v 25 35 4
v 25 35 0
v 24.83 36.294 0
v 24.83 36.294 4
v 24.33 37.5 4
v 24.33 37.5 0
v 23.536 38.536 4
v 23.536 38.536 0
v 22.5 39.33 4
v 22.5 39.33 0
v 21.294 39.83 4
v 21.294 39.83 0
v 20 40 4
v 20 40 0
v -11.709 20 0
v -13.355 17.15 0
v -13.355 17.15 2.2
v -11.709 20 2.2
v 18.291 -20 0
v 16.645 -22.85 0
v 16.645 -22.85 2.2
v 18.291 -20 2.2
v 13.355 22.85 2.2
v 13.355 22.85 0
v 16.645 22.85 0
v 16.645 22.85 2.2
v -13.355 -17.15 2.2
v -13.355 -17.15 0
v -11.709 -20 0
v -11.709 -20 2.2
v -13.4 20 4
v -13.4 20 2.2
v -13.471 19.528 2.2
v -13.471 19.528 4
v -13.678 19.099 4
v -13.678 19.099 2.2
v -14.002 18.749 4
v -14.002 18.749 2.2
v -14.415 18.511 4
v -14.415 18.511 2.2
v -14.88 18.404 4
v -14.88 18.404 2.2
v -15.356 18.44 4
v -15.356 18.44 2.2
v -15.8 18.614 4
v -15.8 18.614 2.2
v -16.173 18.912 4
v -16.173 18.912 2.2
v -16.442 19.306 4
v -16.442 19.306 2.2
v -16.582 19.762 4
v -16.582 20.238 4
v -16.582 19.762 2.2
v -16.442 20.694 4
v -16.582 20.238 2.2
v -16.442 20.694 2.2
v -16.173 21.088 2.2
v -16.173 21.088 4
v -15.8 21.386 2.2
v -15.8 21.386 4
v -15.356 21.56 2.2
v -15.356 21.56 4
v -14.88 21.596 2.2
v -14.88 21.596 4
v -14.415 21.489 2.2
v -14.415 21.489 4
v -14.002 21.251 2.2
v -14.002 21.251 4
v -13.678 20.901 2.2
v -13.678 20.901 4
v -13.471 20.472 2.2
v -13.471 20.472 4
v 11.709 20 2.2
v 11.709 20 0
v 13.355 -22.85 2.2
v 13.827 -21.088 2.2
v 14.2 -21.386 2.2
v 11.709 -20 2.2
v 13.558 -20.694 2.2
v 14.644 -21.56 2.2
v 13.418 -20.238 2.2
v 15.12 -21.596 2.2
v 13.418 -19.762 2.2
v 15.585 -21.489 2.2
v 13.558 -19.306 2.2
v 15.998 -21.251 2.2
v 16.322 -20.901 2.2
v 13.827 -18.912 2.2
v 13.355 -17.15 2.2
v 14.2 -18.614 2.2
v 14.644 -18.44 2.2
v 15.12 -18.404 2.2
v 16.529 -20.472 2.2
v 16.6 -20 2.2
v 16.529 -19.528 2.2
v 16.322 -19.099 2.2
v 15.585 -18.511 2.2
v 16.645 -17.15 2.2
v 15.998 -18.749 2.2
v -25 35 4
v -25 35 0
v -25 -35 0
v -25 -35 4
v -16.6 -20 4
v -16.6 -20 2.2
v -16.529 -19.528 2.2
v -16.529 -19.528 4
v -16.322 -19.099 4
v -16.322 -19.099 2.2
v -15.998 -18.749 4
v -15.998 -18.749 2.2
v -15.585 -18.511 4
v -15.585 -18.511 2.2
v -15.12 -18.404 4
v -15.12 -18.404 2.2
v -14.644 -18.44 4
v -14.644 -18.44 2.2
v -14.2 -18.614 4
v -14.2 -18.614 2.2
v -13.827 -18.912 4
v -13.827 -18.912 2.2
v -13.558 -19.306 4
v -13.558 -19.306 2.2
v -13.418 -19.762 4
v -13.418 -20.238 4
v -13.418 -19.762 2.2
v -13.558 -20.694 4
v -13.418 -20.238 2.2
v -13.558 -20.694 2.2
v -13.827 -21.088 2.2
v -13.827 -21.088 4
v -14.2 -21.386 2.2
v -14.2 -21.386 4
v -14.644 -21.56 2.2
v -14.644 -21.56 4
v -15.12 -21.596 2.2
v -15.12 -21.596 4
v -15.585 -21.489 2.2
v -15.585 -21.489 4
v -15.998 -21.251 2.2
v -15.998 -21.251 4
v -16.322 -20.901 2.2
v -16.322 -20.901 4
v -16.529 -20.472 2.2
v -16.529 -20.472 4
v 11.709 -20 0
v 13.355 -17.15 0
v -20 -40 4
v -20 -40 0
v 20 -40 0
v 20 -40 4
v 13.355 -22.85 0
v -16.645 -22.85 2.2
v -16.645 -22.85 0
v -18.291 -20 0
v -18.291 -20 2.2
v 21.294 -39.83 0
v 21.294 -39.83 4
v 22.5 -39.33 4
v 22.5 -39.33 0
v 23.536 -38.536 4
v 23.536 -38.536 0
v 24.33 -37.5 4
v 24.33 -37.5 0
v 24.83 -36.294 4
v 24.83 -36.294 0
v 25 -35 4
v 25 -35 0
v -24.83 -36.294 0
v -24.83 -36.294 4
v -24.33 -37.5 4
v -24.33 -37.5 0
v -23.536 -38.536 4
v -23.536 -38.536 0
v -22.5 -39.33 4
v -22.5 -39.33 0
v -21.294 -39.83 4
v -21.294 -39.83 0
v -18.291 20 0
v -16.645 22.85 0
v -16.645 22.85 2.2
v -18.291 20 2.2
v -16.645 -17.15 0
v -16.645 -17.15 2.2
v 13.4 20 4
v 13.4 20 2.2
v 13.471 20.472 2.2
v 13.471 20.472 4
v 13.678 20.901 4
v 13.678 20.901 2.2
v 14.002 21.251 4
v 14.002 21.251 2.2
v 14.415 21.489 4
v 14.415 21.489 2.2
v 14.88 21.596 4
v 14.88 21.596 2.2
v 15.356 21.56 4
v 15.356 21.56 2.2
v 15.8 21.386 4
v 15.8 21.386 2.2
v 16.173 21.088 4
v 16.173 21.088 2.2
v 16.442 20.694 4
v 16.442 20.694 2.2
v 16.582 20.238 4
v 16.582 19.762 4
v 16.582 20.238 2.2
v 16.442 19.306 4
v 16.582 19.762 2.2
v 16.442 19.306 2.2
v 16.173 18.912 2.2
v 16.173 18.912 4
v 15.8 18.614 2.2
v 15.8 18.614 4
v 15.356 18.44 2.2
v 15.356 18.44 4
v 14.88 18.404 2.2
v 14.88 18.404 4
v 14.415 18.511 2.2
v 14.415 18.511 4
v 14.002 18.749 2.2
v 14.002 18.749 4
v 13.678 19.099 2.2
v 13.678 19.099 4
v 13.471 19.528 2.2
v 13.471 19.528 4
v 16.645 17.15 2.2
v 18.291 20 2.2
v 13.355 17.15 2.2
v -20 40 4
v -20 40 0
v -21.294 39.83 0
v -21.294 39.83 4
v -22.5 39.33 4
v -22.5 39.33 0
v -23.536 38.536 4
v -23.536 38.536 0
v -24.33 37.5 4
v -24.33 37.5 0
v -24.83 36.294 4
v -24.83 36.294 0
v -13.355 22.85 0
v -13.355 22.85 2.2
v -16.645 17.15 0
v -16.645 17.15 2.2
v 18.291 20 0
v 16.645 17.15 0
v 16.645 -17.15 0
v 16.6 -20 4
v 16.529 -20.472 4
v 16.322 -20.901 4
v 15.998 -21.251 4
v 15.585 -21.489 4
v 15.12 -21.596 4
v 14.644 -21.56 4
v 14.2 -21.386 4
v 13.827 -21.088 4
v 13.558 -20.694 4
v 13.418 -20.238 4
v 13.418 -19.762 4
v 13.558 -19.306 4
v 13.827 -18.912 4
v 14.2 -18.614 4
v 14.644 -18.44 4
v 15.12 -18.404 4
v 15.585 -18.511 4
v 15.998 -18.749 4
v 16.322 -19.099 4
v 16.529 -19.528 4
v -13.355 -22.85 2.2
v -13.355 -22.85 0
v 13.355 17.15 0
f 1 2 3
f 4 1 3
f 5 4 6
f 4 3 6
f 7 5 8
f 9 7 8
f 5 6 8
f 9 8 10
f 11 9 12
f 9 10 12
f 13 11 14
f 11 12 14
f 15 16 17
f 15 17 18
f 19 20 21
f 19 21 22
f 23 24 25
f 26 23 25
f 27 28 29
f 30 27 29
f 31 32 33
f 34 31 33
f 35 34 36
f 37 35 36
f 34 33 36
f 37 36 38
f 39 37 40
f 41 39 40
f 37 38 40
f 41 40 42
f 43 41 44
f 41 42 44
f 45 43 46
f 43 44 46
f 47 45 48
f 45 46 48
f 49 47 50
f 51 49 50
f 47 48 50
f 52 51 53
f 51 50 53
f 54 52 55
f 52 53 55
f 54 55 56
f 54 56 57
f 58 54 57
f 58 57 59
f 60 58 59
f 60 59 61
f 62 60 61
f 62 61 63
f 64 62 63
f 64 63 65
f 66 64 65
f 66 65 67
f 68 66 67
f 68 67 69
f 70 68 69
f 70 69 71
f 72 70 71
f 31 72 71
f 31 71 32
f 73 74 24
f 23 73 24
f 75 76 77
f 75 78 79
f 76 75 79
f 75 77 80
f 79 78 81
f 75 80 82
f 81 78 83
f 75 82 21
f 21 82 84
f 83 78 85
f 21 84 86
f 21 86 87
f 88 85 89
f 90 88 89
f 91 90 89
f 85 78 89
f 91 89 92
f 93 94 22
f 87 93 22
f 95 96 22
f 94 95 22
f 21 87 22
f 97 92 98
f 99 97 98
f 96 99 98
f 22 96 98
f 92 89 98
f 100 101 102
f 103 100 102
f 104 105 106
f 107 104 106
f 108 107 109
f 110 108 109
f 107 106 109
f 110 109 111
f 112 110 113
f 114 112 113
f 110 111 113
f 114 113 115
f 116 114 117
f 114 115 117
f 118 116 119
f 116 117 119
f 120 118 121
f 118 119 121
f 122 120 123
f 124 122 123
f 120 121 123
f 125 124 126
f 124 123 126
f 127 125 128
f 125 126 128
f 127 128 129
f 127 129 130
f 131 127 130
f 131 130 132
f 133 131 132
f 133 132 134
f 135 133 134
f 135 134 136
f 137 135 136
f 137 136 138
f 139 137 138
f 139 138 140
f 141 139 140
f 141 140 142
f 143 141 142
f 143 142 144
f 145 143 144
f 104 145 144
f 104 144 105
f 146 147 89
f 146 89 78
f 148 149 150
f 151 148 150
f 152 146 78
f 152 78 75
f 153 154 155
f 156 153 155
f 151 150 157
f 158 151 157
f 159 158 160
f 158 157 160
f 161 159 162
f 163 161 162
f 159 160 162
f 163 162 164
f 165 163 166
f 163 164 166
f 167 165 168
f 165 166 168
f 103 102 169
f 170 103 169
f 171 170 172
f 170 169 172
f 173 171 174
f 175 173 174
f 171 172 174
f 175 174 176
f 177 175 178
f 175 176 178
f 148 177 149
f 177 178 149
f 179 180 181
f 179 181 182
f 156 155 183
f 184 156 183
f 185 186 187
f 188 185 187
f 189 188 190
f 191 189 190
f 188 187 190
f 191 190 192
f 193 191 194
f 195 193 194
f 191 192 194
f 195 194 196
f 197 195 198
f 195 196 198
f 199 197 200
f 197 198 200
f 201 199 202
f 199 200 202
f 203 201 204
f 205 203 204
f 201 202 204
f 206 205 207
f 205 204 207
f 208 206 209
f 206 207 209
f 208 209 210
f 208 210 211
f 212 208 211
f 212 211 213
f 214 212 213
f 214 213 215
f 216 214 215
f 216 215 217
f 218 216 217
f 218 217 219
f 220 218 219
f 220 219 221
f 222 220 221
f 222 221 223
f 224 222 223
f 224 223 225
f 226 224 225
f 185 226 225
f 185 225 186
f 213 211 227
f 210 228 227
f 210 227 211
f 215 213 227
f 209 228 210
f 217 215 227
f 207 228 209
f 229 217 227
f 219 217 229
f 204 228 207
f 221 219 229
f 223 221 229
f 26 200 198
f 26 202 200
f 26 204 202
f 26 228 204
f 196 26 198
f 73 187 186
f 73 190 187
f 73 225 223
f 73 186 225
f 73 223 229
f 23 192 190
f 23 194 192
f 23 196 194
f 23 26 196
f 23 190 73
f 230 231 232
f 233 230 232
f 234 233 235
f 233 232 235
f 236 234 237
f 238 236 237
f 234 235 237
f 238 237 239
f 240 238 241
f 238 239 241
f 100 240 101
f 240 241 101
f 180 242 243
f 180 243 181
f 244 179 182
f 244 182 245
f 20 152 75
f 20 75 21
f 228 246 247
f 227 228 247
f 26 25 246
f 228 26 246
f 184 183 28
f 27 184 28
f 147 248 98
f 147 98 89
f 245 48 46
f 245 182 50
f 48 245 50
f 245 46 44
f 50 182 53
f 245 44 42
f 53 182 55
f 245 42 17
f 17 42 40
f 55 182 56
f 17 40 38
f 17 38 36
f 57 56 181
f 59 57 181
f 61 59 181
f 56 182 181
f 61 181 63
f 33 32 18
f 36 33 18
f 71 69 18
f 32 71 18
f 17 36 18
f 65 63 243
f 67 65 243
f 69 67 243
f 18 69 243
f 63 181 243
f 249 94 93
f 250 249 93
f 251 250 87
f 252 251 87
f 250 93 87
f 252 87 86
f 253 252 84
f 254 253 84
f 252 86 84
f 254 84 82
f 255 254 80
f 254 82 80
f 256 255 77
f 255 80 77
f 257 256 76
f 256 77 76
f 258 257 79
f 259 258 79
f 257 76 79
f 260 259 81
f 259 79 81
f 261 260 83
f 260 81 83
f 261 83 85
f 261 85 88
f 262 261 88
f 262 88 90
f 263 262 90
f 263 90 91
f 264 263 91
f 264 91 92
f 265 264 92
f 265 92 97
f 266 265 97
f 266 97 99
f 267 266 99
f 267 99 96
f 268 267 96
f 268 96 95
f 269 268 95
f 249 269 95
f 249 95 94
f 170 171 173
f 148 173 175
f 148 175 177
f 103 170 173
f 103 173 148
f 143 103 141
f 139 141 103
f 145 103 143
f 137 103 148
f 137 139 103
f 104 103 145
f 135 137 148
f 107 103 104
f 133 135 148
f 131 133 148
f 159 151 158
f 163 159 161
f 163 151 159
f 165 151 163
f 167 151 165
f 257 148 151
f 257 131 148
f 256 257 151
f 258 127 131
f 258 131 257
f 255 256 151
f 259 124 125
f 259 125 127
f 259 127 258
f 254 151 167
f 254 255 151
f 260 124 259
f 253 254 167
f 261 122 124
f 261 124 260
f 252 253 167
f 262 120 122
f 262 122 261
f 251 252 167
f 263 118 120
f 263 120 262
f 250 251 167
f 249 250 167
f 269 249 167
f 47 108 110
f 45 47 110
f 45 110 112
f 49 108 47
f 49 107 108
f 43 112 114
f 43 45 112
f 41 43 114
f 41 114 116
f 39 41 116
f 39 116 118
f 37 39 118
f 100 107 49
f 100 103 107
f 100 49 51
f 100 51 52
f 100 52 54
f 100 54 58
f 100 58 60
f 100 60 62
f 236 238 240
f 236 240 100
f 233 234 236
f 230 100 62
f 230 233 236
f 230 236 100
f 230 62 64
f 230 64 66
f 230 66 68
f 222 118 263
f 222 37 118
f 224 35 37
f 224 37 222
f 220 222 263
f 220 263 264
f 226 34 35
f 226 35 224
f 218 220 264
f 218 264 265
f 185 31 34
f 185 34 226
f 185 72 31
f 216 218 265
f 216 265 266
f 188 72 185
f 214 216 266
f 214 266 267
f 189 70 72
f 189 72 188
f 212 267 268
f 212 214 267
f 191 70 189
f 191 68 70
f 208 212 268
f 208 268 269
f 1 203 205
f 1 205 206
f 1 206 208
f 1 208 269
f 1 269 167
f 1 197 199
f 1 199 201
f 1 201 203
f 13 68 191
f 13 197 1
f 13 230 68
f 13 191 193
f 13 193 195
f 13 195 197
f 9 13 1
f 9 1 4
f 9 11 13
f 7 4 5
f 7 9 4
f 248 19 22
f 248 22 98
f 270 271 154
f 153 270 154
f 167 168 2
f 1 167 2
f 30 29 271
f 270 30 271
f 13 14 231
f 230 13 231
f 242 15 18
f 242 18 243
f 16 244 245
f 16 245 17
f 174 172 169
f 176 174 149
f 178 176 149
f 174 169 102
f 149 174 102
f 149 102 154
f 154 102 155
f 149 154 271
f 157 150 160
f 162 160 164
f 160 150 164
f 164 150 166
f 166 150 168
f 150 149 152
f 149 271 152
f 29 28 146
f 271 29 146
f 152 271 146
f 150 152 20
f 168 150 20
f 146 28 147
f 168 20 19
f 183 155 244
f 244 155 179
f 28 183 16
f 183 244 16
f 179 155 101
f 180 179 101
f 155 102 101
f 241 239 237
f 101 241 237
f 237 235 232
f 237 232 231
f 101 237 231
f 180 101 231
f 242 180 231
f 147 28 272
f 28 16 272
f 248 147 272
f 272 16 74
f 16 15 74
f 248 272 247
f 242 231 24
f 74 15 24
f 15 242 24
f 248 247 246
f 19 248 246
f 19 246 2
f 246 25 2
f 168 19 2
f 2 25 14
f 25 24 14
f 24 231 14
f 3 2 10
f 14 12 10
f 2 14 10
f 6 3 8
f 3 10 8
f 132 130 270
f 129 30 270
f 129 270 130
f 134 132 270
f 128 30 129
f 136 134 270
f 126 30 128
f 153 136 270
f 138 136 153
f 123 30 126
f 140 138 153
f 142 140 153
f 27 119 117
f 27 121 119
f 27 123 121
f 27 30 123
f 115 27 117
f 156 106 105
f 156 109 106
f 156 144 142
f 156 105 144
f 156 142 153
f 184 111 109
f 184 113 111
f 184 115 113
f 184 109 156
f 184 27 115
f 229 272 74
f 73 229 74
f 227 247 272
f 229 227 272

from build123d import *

# Parameters (mm, degrees)
DODANIE_WYCI_GNI_CIE1_DEPTH = 4
WYTNIJ_WYCI_GNI_CIE1_REACH  = 49.339
SZKIC2_R                    = 1.6
SZKIC3_R                    = 1.6
WYTNIJ_WYCI_GNI_CIE2_DEPTH  = 2.2


with BuildPart() as part:
    # Szkic1 → Dodanie-wyciągnięcie1 (new body)
    with BuildSketch(Plane.XY):
        with BuildLine():
            Line((-20, -40), (20, -40))
            ThreePointArc((20, -40), (23.535533906, -38.535533906), (25, -35))
            Line((25, -35), (25, 35))
            ThreePointArc((25, 35), (23.535533906, 38.535533906), (20, 40))
            Line((20, 40), (-20, 40))
            ThreePointArc((-20, 40), (-23.535533906, 38.535533906), (-25, 35))
            Line((-25, 35), (-25, -35))
            ThreePointArc((-25, -35), (-23.535533906, -38.535533906), (-20, -40))
        make_face()
    extrude(amount=DODANIE_WYCI_GNI_CIE1_DEPTH)

    # Szkic2 → Wytnij-wyciągnięcie1 (cut, up to next)
    with BuildSketch(Plane(origin=(0, 0, 0), x_dir=(-1, 0, 0), z_dir=(0, 0, -1)), mode=Mode.PRIVATE) as wytnij_wyci_gni_cie1_sk1:
        with Locations((-15, 20)):
            Circle(SZKIC2_R)
    wytnij_wyci_gni_cie1_tool1 = extrude(wytnij_wyci_gni_cie1_sk1.sketch, amount=-WYTNIJ_WYCI_GNI_CIE1_REACH, mode=Mode.PRIVATE) & part.part
    # Szkic2 → Wytnij-wyciągnięcie1 (cut, up to next)
    with BuildSketch(Plane(origin=(0, 0, 0), x_dir=(-1, 0, 0), z_dir=(0, 0, -1)), mode=Mode.PRIVATE) as wytnij_wyci_gni_cie1_sk2:
        with Locations(Location((15, 20, 0), (0, 0, 180))):
            Circle(SZKIC2_R)
    wytnij_wyci_gni_cie1_tool2 = extrude(wytnij_wyci_gni_cie1_sk2.sketch, amount=-WYTNIJ_WYCI_GNI_CIE1_REACH, mode=Mode.PRIVATE) & part.part
    # Szkic2 → Wytnij-wyciągnięcie1 (cut, up to next)
    with BuildSketch(Plane(origin=(0, 0, 0), x_dir=(-1, 0, 0), z_dir=(0, 0, -1)), mode=Mode.PRIVATE) as wytnij_wyci_gni_cie1_sk3:
        with Locations((15, -20)):
            Circle(SZKIC2_R)
    wytnij_wyci_gni_cie1_tool3 = extrude(wytnij_wyci_gni_cie1_sk3.sketch, amount=-WYTNIJ_WYCI_GNI_CIE1_REACH, mode=Mode.PRIVATE) & part.part
    # Szkic2 → Wytnij-wyciągnięcie1 (cut, up to next)
    with BuildSketch(Plane(origin=(0, 0, 0), x_dir=(-1, 0, 0), z_dir=(0, 0, -1)), mode=Mode.PRIVATE) as wytnij_wyci_gni_cie1_sk4:
        with Locations(Location((-15, -20, 0), (0, 0, 180))):
            Circle(SZKIC2_R)
    wytnij_wyci_gni_cie1_tool4 = extrude(wytnij_wyci_gni_cie1_sk4.sketch, amount=-WYTNIJ_WYCI_GNI_CIE1_REACH, mode=Mode.PRIVATE) & part.part
    add(wytnij_wyci_gni_cie1_tool1.solids().sort_by_distance((15, 20, 0))[0], mode=Mode.SUBTRACT)
    add(wytnij_wyci_gni_cie1_tool2.solids().sort_by_distance((-15, 20, 0))[0], mode=Mode.SUBTRACT)
    add(wytnij_wyci_gni_cie1_tool3.solids().sort_by_distance((-15, -20, 0))[0], mode=Mode.SUBTRACT)
    add(wytnij_wyci_gni_cie1_tool4.solids().sort_by_distance((15, -20, 0))[0], mode=Mode.SUBTRACT)

    # Szkic3 → Wytnij-wyciągnięcie2 (cut)
    # profile 1 of 4: a face of its own
    with BuildSketch(Plane(origin=(0, 0, 0), x_dir=(-1, 0, 0), z_dir=(0, 0, -1))):
        Polygon((-11.709103466, 20), (-13.354551733, 22.85), (-16.645448267, 22.85), (-18.290896534, 20), (-16.645448267, 17.15), (-13.354551733, 17.15), align=None)
        with Locations((-15, 20)):
            Circle(SZKIC3_R, mode=Mode.SUBTRACT)
    # profile 2 of 4: a face of its own
    with BuildSketch(Plane(origin=(0, 0, 0), x_dir=(-1, 0, 0), z_dir=(0, 0, -1))):
        Polygon((13.354551733, 17.15), (11.709103466, 20), (13.354551733, 22.85), (16.645448267, 22.85), (18.290896534, 20), (16.645448267, 17.15), align=None)
        with Locations(Location((15, 20, 0), (0, 0, 180))):
            Circle(SZKIC3_R, mode=Mode.SUBTRACT)
    # profile 3 of 4: a face of its own
    with BuildSketch(Plane(origin=(0, 0, 0), x_dir=(-1, 0, 0), z_dir=(0, 0, -1))):
        Polygon((11.709103466, -20), (13.354551733, -22.85), (16.645448267, -22.85), (18.290896534, -20), (16.645448267, -17.15), (13.354551733, -17.15), align=None)
        with Locations((15, -20)):
            Circle(SZKIC3_R, mode=Mode.SUBTRACT)
    # profile 4 of 4: a face of its own
    with BuildSketch(Plane(origin=(0, 0, 0), x_dir=(-1, 0, 0), z_dir=(0, 0, -1))):
        Polygon((-13.354551733, -17.15), (-11.709103466, -20), (-13.354551733, -22.85), (-16.645448267, -22.85), (-18.290896534, -20), (-16.645448267, -17.15), align=None)
        with Locations(Location((-15, -20, 0), (0, 0, 180))):
            Circle(SZKIC3_R, mode=Mode.SUBTRACT)
    extrude(amount=-WYTNIJ_WYCI_GNI_CIE2_DEPTH, mode=Mode.SUBTRACT)


solid = part.part
